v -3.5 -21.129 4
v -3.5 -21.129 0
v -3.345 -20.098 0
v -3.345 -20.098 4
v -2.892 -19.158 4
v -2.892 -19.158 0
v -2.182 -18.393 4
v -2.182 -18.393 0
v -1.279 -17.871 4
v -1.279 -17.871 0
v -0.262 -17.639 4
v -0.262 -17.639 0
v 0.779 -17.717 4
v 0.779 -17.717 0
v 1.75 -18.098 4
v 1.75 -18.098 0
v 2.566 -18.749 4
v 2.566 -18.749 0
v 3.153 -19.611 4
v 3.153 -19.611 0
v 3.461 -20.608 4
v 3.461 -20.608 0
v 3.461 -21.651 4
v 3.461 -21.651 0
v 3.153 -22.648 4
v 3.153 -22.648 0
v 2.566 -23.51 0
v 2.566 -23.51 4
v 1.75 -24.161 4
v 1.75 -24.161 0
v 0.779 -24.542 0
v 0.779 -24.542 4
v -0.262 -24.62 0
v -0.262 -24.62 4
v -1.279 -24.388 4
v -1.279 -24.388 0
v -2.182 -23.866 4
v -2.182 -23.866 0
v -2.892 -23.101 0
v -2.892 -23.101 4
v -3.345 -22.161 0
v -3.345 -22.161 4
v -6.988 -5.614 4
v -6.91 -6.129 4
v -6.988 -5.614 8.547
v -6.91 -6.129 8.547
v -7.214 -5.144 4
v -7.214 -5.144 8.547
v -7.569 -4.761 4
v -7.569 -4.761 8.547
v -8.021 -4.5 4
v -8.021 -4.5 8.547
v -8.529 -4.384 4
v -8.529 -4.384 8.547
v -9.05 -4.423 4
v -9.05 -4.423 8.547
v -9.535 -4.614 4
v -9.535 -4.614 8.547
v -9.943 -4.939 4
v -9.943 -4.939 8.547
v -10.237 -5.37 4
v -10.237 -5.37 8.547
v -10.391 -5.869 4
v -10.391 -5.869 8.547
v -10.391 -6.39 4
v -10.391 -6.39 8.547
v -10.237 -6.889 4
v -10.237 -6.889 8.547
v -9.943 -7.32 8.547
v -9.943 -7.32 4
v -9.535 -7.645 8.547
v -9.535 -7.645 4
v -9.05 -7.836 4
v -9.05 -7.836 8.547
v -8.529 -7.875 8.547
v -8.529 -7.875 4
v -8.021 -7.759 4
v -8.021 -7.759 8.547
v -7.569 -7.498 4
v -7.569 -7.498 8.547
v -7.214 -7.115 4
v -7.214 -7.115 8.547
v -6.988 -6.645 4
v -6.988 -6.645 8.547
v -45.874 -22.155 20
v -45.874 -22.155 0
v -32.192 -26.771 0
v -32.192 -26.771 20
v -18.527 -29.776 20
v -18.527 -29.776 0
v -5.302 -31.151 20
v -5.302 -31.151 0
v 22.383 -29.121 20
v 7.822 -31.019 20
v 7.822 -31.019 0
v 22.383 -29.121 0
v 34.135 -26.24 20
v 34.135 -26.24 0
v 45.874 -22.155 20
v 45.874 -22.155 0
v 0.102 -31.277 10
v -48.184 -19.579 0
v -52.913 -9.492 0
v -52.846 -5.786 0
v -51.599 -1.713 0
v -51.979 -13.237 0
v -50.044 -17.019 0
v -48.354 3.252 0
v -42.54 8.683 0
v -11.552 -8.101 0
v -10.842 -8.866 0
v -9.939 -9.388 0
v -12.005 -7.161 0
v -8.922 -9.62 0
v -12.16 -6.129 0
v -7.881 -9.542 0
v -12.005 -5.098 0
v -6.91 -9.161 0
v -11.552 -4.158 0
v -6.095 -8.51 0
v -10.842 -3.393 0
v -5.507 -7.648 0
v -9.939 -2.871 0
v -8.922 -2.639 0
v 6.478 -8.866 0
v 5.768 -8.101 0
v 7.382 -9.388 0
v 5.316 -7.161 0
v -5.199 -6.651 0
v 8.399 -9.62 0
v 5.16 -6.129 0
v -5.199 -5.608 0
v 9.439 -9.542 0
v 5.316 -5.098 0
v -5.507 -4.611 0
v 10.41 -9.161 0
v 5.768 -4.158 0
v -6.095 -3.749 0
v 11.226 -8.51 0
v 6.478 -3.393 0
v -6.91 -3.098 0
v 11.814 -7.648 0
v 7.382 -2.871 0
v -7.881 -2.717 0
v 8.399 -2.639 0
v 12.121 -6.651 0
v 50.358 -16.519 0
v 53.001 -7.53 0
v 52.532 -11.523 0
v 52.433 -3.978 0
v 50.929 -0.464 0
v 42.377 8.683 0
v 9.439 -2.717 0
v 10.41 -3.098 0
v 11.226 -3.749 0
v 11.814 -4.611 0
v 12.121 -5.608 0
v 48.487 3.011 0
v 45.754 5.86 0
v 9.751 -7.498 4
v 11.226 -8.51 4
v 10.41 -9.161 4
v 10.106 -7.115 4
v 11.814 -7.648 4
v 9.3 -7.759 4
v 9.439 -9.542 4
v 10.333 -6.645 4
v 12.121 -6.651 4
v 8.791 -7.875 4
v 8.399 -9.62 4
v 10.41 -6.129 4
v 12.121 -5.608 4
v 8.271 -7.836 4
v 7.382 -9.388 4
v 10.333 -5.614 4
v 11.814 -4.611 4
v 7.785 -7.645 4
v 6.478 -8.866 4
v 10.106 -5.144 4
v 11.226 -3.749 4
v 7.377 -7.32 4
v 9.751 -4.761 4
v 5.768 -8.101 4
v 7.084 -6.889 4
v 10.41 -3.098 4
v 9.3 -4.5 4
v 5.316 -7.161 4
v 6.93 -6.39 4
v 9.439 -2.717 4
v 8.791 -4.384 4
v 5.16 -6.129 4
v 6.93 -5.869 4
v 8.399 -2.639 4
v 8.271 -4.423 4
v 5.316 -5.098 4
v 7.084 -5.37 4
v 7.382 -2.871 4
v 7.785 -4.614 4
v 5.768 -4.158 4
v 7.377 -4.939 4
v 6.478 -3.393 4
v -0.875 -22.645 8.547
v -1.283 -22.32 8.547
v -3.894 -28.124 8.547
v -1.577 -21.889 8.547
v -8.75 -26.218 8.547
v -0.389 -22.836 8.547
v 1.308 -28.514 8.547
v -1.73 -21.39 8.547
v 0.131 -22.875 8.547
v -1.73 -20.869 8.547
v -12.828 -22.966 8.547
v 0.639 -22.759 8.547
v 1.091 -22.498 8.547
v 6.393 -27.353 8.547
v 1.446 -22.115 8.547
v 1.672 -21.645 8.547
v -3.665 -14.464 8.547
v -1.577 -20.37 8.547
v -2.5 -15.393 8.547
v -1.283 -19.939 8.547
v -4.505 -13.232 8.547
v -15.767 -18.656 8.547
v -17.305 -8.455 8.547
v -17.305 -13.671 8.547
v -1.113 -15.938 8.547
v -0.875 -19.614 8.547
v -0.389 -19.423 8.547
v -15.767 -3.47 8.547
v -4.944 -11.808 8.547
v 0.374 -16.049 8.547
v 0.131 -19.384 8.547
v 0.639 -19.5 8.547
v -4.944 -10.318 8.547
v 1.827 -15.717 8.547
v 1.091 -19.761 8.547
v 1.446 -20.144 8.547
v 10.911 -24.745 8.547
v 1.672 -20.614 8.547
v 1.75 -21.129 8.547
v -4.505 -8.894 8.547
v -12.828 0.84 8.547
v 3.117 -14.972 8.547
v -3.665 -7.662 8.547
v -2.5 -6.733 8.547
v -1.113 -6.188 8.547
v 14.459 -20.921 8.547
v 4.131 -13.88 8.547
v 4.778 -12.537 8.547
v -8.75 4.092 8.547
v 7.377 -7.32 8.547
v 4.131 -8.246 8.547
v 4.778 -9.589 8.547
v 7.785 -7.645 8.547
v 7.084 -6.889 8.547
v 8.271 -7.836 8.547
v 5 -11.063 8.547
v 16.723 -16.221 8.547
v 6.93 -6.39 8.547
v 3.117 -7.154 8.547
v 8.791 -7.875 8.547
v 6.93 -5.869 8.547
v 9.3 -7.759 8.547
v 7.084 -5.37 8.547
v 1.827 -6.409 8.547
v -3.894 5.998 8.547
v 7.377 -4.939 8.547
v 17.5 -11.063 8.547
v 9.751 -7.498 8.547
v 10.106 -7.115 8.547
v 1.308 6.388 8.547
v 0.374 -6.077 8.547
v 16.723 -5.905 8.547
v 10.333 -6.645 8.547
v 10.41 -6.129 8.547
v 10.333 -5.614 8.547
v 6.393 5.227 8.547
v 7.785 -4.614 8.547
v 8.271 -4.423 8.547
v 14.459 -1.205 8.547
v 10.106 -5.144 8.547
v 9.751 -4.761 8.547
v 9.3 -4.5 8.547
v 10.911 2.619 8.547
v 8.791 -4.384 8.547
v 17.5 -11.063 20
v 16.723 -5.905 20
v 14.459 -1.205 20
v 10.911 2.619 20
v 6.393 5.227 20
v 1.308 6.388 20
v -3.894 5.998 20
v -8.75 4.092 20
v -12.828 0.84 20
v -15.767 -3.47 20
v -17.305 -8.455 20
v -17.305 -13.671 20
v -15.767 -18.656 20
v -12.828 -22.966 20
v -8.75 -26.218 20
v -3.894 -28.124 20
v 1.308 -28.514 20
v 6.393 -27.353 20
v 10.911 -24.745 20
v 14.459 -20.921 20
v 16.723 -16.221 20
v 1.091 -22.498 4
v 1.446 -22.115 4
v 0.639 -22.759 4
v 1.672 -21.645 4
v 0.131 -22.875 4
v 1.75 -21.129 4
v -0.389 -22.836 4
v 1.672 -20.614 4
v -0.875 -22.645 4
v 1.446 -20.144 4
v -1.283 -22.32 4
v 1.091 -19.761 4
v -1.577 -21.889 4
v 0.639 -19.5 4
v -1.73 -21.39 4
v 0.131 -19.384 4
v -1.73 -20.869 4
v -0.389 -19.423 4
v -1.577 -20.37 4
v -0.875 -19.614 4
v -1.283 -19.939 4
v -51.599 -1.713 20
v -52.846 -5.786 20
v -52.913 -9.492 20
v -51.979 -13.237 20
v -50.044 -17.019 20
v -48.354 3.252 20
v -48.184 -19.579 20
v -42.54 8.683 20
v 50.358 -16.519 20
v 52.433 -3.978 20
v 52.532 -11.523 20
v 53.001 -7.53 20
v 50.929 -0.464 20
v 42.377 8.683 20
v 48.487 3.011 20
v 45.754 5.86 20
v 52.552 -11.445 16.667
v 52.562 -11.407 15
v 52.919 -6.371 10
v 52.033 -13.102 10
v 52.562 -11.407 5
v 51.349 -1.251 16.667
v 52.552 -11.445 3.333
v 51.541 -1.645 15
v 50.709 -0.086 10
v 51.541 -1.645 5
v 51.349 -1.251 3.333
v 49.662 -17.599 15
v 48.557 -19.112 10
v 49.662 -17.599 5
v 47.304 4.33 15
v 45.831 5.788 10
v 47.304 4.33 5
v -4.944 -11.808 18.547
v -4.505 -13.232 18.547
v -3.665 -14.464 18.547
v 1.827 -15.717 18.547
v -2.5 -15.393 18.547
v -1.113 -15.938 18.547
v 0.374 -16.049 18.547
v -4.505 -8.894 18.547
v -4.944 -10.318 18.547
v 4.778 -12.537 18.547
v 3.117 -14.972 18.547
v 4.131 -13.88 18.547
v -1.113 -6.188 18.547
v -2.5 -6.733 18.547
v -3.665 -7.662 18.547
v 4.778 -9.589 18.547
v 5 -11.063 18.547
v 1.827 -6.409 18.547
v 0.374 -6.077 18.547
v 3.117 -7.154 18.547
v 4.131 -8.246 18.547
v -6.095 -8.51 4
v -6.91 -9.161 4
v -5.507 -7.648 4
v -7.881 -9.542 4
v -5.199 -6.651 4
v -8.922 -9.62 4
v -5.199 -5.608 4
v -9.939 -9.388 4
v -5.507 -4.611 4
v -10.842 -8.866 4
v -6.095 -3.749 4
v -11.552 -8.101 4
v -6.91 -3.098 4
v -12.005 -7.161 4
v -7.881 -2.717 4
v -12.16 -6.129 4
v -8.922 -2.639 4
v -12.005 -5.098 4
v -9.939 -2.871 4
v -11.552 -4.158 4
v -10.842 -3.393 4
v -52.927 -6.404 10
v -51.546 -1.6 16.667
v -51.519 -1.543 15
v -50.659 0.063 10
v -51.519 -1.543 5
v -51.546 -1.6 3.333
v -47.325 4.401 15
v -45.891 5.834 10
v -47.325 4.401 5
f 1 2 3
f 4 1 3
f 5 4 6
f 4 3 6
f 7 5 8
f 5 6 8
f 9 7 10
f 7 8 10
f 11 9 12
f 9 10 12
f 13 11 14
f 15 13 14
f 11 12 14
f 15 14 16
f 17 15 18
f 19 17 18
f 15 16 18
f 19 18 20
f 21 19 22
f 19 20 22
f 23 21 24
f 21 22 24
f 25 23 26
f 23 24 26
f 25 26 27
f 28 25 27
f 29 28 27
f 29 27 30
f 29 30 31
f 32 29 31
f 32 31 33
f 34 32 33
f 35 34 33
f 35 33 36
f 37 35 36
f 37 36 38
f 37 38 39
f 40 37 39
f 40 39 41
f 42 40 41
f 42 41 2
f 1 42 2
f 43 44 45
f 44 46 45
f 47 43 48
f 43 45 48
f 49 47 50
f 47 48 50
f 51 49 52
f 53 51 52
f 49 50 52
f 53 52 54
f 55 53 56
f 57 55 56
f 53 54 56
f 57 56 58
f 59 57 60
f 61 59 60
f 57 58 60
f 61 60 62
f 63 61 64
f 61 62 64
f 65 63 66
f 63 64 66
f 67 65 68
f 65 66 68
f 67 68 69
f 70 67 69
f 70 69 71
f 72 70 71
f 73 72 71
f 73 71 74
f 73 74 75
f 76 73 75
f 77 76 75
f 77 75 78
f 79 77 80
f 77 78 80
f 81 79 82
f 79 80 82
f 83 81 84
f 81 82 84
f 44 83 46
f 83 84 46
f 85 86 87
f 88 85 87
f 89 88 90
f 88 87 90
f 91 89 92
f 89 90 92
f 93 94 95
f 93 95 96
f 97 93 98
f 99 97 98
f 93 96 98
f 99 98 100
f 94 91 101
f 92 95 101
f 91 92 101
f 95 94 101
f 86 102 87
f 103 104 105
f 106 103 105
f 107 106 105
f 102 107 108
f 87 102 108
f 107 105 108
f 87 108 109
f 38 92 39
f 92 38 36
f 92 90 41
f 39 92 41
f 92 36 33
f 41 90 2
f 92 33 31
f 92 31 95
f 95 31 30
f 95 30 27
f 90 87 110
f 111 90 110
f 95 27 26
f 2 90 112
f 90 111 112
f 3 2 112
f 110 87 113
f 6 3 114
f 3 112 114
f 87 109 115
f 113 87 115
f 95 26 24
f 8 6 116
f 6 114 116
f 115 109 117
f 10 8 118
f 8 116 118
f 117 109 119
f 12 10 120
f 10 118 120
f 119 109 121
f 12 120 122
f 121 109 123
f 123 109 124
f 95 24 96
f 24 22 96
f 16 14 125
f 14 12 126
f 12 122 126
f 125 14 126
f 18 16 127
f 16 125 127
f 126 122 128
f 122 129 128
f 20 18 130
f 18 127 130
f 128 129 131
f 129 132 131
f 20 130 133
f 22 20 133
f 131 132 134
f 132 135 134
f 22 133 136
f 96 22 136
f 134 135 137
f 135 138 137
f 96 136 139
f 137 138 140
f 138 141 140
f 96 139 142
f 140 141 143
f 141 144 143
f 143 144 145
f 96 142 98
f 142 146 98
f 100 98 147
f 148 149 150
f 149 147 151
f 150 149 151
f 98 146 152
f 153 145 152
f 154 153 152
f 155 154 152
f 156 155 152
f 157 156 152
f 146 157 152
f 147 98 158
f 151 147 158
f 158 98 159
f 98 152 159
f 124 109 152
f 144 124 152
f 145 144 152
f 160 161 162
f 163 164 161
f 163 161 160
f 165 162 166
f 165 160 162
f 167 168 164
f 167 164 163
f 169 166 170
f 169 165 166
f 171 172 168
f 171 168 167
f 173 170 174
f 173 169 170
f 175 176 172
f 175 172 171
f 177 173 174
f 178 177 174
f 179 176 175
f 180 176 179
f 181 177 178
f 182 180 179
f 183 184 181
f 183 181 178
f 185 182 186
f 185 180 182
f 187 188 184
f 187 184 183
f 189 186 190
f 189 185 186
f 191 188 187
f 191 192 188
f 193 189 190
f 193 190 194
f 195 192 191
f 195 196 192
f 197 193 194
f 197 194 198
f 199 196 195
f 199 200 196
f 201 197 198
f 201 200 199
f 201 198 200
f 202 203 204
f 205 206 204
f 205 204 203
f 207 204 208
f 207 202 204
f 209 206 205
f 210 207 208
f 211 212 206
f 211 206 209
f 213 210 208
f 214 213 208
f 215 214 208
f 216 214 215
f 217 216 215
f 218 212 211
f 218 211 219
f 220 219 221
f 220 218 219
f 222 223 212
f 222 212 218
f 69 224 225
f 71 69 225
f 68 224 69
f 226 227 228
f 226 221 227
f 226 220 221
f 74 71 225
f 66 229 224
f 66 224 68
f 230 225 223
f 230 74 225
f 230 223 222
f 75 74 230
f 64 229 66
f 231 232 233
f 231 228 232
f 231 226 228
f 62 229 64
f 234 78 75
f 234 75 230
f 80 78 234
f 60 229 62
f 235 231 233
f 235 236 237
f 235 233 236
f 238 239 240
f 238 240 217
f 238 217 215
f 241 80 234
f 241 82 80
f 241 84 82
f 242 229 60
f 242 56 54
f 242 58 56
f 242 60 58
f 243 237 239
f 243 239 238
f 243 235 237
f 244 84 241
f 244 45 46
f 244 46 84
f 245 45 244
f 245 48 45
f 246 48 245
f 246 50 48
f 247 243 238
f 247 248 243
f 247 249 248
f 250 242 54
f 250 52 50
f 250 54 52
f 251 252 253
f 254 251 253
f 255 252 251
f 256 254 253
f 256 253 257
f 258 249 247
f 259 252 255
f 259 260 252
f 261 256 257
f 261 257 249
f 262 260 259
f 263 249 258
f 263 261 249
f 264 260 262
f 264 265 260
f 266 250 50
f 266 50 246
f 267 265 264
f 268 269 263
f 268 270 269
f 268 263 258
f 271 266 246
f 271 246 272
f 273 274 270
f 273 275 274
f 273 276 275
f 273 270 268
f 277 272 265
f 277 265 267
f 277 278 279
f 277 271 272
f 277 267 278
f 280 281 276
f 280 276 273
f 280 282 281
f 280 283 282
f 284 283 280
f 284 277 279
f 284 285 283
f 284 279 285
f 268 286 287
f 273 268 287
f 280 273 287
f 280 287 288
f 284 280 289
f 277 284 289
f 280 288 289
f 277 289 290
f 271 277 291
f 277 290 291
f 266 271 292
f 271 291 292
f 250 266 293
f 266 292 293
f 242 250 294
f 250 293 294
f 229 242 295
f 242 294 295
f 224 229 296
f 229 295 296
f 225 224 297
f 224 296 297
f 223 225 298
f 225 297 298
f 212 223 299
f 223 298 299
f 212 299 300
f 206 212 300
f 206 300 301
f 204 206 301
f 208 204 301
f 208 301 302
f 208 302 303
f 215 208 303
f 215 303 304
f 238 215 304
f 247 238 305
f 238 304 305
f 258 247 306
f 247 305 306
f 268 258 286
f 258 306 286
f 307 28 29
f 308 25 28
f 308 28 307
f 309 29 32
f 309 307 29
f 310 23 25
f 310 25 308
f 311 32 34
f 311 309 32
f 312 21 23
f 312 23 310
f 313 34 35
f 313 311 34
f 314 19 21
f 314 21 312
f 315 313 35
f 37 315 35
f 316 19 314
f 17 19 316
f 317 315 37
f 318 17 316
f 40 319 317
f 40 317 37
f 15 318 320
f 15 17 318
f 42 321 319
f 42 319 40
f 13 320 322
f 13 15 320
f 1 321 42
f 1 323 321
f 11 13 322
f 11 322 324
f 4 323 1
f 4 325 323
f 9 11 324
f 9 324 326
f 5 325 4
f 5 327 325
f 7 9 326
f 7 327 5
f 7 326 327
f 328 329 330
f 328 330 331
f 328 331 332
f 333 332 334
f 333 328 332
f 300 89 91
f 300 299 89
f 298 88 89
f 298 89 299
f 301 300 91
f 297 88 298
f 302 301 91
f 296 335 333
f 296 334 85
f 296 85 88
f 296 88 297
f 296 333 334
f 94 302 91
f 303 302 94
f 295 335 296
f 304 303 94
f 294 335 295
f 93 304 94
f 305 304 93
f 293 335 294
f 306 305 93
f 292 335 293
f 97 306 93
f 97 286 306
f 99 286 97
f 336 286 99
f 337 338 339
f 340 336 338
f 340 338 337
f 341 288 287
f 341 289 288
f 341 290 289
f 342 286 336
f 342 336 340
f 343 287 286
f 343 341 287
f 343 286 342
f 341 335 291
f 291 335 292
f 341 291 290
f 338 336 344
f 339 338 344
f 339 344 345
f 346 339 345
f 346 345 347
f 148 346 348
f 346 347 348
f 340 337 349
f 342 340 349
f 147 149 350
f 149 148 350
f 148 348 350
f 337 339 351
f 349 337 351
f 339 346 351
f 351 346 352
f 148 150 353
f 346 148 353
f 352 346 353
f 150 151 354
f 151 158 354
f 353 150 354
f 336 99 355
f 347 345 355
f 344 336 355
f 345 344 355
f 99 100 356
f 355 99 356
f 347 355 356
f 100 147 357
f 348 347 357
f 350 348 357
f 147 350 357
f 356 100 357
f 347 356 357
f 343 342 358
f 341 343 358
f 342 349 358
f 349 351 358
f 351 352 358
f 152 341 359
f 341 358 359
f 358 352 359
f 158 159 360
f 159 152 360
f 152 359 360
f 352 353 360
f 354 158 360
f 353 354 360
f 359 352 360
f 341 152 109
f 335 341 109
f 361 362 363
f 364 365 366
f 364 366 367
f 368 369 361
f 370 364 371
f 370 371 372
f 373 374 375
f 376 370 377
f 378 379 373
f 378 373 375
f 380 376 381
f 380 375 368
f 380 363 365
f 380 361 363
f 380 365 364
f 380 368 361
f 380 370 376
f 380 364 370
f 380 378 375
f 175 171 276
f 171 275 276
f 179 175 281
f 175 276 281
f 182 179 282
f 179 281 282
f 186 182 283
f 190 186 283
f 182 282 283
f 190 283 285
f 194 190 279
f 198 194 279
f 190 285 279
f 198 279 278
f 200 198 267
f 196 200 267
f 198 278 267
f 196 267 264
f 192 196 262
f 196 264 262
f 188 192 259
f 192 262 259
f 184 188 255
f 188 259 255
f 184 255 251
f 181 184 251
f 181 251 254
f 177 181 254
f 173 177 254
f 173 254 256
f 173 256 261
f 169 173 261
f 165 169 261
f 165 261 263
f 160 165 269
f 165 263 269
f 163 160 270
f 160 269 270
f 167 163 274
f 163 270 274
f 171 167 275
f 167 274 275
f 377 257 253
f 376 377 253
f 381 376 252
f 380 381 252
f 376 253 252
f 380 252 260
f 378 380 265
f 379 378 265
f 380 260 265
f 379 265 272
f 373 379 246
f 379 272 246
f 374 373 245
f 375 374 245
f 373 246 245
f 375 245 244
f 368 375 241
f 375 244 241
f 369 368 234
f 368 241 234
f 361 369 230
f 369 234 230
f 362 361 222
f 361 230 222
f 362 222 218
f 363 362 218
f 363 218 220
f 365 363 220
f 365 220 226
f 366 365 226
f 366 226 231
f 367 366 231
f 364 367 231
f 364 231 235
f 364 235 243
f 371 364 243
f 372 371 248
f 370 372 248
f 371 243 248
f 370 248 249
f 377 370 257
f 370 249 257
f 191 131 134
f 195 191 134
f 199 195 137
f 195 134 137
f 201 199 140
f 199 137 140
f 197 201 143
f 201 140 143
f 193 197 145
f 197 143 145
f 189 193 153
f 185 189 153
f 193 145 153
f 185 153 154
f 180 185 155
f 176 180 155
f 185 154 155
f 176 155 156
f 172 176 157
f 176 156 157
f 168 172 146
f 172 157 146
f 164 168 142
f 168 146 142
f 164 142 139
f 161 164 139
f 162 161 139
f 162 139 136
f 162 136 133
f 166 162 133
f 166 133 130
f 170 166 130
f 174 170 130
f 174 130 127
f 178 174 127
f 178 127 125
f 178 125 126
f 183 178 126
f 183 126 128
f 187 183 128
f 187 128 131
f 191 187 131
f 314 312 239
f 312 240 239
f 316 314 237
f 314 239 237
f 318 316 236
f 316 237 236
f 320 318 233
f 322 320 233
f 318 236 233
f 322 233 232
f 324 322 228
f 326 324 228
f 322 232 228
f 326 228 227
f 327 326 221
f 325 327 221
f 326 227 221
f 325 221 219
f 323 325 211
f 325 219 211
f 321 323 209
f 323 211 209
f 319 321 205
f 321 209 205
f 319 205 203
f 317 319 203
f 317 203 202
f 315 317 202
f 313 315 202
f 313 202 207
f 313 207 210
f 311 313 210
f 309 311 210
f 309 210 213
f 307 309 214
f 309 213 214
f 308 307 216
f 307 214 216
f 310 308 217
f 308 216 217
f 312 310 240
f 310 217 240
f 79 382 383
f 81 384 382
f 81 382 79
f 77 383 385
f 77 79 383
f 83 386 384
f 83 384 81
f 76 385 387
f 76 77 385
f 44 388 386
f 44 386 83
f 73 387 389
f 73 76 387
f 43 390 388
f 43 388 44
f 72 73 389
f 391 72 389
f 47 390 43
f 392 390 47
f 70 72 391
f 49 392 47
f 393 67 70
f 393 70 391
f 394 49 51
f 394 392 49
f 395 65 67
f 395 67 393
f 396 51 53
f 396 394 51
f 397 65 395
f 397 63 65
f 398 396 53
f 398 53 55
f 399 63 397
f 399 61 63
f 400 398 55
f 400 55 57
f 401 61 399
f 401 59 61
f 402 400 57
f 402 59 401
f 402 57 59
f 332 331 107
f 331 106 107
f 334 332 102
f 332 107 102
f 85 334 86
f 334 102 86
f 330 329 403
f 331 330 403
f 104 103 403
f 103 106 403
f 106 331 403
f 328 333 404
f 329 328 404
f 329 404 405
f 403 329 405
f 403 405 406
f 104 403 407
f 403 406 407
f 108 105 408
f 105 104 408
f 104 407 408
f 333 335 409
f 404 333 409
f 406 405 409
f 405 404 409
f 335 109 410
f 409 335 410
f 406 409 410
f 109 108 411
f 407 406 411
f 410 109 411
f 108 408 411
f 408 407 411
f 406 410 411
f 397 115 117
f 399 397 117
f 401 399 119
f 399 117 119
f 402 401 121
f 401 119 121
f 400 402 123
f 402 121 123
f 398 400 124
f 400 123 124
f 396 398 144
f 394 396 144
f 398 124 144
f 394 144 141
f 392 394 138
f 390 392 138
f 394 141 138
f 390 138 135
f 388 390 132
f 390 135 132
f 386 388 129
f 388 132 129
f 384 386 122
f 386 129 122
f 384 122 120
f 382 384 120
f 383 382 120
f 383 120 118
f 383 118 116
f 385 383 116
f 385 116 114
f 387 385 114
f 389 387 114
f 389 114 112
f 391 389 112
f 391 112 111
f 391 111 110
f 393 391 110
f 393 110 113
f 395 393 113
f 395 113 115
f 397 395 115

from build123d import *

# Parameters (mm, degrees)
BOSS_EXTRUDE1_DEPTH                              = 20
SKETCH4_R                                        = 17.5
CUT_EXTRUDE1_DEPTH                               = 11.453250926
SKETCH5_R                                        = 5
BOSS_EXTRUDE2_DEPTH                              = 10
CBORE_FOR_M5_HEX_HEAD_MACHINE_SCREW2_D           = 3.5
CBORE_FOR_M5_HEX_HEAD_MACHINE_SCREW2_DEPTH       = 11
CBORE_FOR_M5_HEX_HEAD_MACHINE_SCREW2_CBORE_D     = 7
CBORE_FOR_M5_HEX_HEAD_MACHINE_SCREW2_CBORE_DEPTH = 4
CBORE_FOR_M5_HEX_HEAD_MACHINE_SCREW2_TIP         = 1.75


with BuildPart() as part:
    # Sketch2 → Boss-Extrude1 (new body)
    with BuildSketch(Plane.XY):
        with BuildLine():
            Line((42.376776125, 8.683218748), (-42.540089832, 8.683218747))
            add(Edge.make_bspline(
                [(-42.540089832, 8.683218747), (-61.647606257, -6.072667773), (-45.873698376, -22.15549797)],
                knots=[0, 0, 0, 1, 1, 1], degree=2))
            add(Edge.make_bspline(
                [(-45.873698376, -22.15549797), (0.203235462, -40.398996626), (45.873698397, -22.155497949)],
                knots=[0, 0, 0, 1, 1, 1], degree=2))
            add(Edge.make_bspline(
                [(45.873698397, -22.155497949), (61.713202875, -6.005950809), (42.376776125, 8.683218748)],
                knots=[0, 0, 0, 1, 1, 1], degree=2))
        make_face()
    extrude(amount=BOSS_EXTRUDE1_DEPTH)

    # Sketch4 → Cut-Extrude1 (cut)
    with BuildSketch(Plane.XY.offset(20)):
        with Locations((0, -11.063024907)):
            Circle(SKETCH4_R)
    extrude(amount=-CUT_EXTRUDE1_DEPTH, mode=Mode.SUBTRACT)

    # Sketch5 → Boss-Extrude2 (add)
    with BuildSketch(Plane.XY.offset(8.546749074)):
        with Locations((0, -11.063024907)):
            Circle(SKETCH5_R)
    extrude(amount=BOSS_EXTRUDE2_DEPTH)

    # CBORE for M5 Hex Head Machine Screw2
    with Locations(Plane(origin=(0, 0, 0), x_dir=(-1, 0, 0), z_dir=(0, 0, -1))):
        with Locations((-8.660254038, -6.129479586), (0, -21.129479586), (8.660254038, -6.129479586)):
            CounterBoreHole(CBORE_FOR_M5_HEX_HEAD_MACHINE_SCREW2_D / 2, CBORE_FOR_M5_HEX_HEAD_MACHINE_SCREW2_CBORE_D / 2, CBORE_FOR_M5_HEX_HEAD_MACHINE_SCREW2_CBORE_DEPTH, depth=CBORE_FOR_M5_HEX_HEAD_MACHINE_SCREW2_DEPTH)
            with Locations((0, 0, -(CBORE_FOR_M5_HEX_HEAD_MACHINE_SCREW2_DEPTH + CBORE_FOR_M5_HEX_HEAD_MACHINE_SCREW2_TIP / 2))):  # 90° drill point
                Cone(0, CBORE_FOR_M5_HEX_HEAD_MACHINE_SCREW2_D / 2, CBORE_FOR_M5_HEX_HEAD_MACHINE_SCREW2_TIP, mode=Mode.SUBTRACT)


solid = part.part
